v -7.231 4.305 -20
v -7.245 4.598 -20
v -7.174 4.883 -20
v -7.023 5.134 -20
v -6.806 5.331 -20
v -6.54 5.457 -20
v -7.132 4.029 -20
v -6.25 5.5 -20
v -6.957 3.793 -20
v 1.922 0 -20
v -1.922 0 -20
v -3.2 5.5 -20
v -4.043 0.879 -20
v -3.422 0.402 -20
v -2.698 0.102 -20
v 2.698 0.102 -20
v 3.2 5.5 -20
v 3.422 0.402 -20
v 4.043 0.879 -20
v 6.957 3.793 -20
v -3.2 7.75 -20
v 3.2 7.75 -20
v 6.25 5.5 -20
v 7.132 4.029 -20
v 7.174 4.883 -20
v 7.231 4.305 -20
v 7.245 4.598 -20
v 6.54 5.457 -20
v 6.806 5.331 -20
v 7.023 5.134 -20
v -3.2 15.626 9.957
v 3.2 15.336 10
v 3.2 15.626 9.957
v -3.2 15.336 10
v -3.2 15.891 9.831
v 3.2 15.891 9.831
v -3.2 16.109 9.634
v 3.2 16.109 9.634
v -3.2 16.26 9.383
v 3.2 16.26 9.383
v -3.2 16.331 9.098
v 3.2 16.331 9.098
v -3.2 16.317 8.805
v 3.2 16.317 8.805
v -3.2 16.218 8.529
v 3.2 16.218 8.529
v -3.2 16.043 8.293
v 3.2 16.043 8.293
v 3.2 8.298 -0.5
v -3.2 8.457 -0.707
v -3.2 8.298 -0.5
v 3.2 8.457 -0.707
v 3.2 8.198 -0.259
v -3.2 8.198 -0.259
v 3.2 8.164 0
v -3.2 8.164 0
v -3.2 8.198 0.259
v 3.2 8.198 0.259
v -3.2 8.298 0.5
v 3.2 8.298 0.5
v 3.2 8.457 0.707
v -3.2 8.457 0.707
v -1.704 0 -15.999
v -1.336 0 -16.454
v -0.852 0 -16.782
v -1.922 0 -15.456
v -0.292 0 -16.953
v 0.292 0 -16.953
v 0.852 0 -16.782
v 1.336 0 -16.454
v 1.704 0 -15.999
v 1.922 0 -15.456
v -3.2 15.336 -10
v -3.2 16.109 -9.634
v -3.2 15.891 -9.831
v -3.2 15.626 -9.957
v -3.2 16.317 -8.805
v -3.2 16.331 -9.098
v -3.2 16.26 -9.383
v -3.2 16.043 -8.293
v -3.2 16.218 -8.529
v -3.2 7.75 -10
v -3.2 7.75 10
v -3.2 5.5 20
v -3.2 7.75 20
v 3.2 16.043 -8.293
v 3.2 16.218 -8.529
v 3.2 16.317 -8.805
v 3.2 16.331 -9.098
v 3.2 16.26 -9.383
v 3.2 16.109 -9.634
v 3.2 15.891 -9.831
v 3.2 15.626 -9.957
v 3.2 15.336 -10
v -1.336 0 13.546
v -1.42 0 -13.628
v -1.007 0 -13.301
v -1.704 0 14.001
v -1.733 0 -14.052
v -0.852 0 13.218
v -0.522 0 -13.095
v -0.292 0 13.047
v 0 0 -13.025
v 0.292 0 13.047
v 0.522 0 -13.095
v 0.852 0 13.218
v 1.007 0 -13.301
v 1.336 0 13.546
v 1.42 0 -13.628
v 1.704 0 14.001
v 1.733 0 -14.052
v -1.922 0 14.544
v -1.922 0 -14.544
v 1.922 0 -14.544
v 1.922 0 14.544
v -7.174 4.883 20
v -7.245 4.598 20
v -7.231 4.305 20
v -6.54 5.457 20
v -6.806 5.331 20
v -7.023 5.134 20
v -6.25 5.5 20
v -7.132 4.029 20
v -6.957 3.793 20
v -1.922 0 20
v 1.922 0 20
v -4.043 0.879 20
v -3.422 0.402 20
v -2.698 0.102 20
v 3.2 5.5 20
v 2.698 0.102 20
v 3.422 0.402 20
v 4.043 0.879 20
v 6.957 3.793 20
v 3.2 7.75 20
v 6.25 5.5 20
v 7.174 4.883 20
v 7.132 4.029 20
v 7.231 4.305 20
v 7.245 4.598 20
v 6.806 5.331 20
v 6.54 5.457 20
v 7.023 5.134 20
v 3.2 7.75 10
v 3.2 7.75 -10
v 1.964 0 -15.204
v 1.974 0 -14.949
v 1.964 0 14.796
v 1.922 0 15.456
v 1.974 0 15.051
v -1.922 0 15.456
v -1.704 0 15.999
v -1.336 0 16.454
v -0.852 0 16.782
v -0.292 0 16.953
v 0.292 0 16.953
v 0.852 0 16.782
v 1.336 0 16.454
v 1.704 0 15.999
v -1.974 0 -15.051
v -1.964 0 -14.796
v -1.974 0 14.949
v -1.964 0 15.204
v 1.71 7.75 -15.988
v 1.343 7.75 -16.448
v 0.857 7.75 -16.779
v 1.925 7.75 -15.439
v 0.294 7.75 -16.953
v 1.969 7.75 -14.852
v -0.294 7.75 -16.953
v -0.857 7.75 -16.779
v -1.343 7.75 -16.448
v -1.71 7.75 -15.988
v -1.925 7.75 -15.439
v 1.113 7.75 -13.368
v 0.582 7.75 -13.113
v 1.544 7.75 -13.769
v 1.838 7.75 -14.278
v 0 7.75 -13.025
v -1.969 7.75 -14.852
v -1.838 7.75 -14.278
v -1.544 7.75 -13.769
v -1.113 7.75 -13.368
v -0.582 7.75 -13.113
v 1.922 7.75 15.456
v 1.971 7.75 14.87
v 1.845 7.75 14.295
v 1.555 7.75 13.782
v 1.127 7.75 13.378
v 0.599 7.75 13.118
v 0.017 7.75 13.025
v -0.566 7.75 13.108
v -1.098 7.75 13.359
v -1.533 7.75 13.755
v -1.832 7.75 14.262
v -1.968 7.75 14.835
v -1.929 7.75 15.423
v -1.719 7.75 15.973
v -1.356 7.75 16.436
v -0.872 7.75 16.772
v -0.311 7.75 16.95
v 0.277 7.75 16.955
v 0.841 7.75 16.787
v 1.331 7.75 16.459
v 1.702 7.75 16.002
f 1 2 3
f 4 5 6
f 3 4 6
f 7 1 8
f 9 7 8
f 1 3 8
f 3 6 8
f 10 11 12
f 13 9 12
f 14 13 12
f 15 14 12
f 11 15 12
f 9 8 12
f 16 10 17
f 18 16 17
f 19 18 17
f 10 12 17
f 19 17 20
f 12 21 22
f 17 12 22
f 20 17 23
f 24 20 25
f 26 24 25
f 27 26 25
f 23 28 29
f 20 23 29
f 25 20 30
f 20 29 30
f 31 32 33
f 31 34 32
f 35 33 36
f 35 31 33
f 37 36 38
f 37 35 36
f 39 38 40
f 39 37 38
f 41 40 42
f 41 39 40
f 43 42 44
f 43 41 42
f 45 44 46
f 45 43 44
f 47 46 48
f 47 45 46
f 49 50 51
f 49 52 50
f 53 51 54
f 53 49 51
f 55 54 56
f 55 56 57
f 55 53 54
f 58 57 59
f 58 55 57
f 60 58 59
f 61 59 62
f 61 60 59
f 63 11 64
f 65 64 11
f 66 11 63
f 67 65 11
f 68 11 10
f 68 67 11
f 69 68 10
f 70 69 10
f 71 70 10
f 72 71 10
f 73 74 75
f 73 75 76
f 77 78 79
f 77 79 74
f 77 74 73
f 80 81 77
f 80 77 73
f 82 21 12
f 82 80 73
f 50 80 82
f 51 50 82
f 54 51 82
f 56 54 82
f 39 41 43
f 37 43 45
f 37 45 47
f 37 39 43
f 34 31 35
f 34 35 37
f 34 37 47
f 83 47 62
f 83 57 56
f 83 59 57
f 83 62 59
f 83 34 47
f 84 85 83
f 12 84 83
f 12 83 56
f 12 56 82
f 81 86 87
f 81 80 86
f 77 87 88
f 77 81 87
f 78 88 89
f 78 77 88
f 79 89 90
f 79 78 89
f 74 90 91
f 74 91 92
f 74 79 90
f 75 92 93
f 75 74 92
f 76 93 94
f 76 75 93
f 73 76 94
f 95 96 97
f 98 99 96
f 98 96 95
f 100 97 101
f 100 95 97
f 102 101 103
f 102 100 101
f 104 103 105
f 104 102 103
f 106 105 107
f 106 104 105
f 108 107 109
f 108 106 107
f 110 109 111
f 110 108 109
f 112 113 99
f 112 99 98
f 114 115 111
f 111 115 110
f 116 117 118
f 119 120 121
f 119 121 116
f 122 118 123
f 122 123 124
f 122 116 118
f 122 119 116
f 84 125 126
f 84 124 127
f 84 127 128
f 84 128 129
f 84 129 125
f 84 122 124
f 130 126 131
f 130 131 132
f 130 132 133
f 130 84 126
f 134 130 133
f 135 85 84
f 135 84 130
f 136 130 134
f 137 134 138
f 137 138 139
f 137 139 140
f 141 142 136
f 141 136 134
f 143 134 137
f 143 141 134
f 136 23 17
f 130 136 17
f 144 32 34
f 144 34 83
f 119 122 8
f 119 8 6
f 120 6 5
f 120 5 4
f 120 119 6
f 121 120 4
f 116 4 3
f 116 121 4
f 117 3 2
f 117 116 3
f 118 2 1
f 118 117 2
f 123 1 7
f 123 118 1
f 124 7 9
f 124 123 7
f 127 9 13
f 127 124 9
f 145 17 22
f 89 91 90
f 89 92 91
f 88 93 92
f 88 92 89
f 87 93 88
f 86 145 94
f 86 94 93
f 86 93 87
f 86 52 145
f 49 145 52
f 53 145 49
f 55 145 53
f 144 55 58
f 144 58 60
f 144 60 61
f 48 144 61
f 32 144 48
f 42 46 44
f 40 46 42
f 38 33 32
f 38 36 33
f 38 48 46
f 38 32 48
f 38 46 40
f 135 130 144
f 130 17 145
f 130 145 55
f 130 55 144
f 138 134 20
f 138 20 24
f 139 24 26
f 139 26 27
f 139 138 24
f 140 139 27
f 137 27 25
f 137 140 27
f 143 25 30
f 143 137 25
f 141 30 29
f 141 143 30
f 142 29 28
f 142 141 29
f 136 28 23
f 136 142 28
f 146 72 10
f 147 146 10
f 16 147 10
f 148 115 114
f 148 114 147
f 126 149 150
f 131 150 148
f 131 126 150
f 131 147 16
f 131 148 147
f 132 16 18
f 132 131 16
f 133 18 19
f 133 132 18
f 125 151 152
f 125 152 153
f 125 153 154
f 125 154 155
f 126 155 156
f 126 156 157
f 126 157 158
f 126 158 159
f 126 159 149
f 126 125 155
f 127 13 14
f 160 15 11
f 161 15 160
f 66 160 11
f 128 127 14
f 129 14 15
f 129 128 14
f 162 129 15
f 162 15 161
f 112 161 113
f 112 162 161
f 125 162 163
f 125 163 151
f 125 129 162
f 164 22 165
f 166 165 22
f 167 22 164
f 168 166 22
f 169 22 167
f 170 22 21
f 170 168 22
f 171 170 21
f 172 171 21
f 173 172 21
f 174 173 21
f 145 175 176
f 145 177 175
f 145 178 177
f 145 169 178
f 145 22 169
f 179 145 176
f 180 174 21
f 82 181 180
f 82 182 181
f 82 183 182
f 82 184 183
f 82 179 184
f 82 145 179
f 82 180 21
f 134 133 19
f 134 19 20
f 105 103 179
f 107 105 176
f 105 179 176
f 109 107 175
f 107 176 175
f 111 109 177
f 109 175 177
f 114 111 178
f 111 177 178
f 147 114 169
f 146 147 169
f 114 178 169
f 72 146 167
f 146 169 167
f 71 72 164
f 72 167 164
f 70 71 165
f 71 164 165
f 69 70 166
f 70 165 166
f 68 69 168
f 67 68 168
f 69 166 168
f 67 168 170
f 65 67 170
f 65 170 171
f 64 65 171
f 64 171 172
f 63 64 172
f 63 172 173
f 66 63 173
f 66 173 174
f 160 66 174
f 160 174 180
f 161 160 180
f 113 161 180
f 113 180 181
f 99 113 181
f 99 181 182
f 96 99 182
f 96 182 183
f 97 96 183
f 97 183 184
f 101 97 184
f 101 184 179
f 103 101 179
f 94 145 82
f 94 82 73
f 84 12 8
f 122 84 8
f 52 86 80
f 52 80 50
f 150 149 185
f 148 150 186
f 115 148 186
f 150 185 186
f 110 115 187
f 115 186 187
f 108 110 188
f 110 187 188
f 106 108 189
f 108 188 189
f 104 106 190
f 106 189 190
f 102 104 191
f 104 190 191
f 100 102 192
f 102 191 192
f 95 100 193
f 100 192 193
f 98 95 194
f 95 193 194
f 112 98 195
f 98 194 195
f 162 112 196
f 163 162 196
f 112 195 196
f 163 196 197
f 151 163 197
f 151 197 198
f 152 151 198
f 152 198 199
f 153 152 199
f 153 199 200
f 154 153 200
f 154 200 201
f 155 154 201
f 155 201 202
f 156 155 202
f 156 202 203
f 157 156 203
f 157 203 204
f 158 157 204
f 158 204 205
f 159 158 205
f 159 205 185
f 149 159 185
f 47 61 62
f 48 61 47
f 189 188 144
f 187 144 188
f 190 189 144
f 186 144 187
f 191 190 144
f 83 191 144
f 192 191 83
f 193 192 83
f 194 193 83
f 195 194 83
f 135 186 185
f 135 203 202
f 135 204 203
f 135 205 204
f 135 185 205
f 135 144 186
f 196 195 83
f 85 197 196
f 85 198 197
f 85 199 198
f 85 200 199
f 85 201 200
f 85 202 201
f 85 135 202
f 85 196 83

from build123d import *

# Parameters (mm, degrees)
BOSS_EXTRUDE1_DEPTH             = 20
SKETCH3_R                       = 1.975
CUT_EXTRUDE1_DEPTH              = 23.641223465
BOSS_EXTRUDE2_REACH             = 24.641
BOSS_EXTRUDE2_DIRECTION_2_REACH = 24.641
FILLET1_R                       = 1


with BuildPart() as part:
    # Sketch2 → Boss-Extrude1 (new, symmetric)
    with BuildSketch(Plane.XY):
        with BuildLine():
            Line((-1.921572875, 0), (1.921572875, 0))
            ThreePointArc((1.921572875, 0), (3.069623172, 0.228361402), (4.042893219, 0.878679656))
            Line((4.042893219, 0.878679656), (6.957106781, 3.792893219))
            ThreePointArc((6.957106781, 3.792893219), (7.173879533, 4.882683432), (6.25, 5.5))
            Line((6.25, 5.5), (3.2, 5.5))
            Line((3.2, 5.5), (3.2, 7.75))
            Line((3.2, 7.75), (-3.2, 7.75))
            Line((-3.2, 7.75), (-3.2, 5.5))
            Line((-3.2, 5.5), (-6.25, 5.5))
            ThreePointArc((-6.25, 5.5), (-7.173879533, 4.882683432), (-6.957106781, 3.792893219))
            Line((-6.957106781, 3.792893219), (-4.042893219, 0.878679656))
            ThreePointArc((-4.042893219, 0.878679656), (-3.069623172, 0.228361402), (-1.921572875, 0))
        make_face()
    extrude(amount=BOSS_EXTRUDE1_DEPTH, both=True)

    # Sketch3 → Cut-Extrude1 (cut, through all)
    with BuildSketch(Plane(origin=(0, 7.75, 0), x_dir=(1, 0, 0), z_dir=(0, 1, 0))):
        with Locations(Location((0, 15, 0), (0, 0, 270))):
            Circle(SKETCH3_R)
        with Locations(Location((0, -15, 0), (0, 0, 346.642693005))):
            Circle(SKETCH3_R)
    extrude(amount=-CUT_EXTRUDE1_DEPTH, mode=Mode.SUBTRACT)

    # Boss-Extrude2: up to this face of the body (flat: up to its plane)
    boss_extrude2_end = Plane(part.part.faces().sort_by_distance((3.2, 6.625, 0))[0])
    # Sketch4 → Boss-Extrude2 (add, up to the picked face)
    with BuildSketch(Plane(origin=(0, 0, 0), x_dir=(0, 0, -1), z_dir=(1, 0, 0)), mode=Mode.PRIVATE) as boss_extrude2_sk1:
        Polygon((-10, 17.75), (-10, 7.75), (0, 7.75), align=None)
    boss_extrude2_tool1 = split(extrude(boss_extrude2_sk1.sketch, amount=BOSS_EXTRUDE2_REACH, mode=Mode.PRIVATE), bisect_by=boss_extrude2_end, keep=Keep.BOTH, mode=Mode.PRIVATE)
    # Sketch4 → Boss-Extrude2 (add, up to the picked face)
    with BuildSketch(Plane(origin=(0, 0, 0), x_dir=(0, 0, -1), z_dir=(1, 0, 0)), mode=Mode.PRIVATE) as boss_extrude2_sk2:
        Polygon((10, 17.75), (0, 7.75), (10, 7.75), align=None)
    boss_extrude2_tool2 = split(extrude(boss_extrude2_sk2.sketch, amount=BOSS_EXTRUDE2_REACH, mode=Mode.PRIVATE), bisect_by=boss_extrude2_end, keep=Keep.BOTH, mode=Mode.PRIVATE)
    add(boss_extrude2_tool1.solids().sort_by(Axis((0, 11.083333, 6.666667), (1, 0, 0)))[0])
    add(boss_extrude2_tool2.solids().sort_by(Axis((0, 11.083333, -6.666667), (1, 0, 0)))[0])

    # Boss-Extrude2 direction 2: up to this face of the body (flat: up to its plane)
    boss_extrude2_direction_2_end = Plane(part.part.faces().sort_by_distance((-3.2, 6.625, 0))[0])
    # Sketch4 → Boss-Extrude2 direction 2 (add, up to the picked face)
    with BuildSketch(Plane(origin=(0, 0, 0), x_dir=(0, 0, -1), z_dir=(1, 0, 0)), mode=Mode.PRIVATE) as boss_extrude2_direction_2_sk1:
        Polygon((-10, 17.75), (-10, 7.75), (0, 7.75), align=None)
    boss_extrude2_direction_2_tool1 = split(extrude(boss_extrude2_direction_2_sk1.sketch, amount=-BOSS_EXTRUDE2_DIRECTION_2_REACH, mode=Mode.PRIVATE), bisect_by=boss_extrude2_direction_2_end, keep=Keep.BOTH, mode=Mode.PRIVATE)
    # Sketch4 → Boss-Extrude2 direction 2 (add, up to the picked face)
    with BuildSketch(Plane(origin=(0, 0, 0), x_dir=(0, 0, -1), z_dir=(1, 0, 0)), mode=Mode.PRIVATE) as boss_extrude2_direction_2_sk2:
        Polygon((10, 17.75), (0, 7.75), (10, 7.75), align=None)
    boss_extrude2_direction_2_tool2 = split(extrude(boss_extrude2_direction_2_sk2.sketch, amount=-BOSS_EXTRUDE2_DIRECTION_2_REACH, mode=Mode.PRIVATE), bisect_by=boss_extrude2_direction_2_end, keep=Keep.BOTH, mode=Mode.PRIVATE)
    add(boss_extrude2_direction_2_tool1.solids().sort_by(Axis((0, 11.083333, 6.666667), (-1, 0, 0)))[0])
    add(boss_extrude2_direction_2_tool2.solids().sort_by(Axis((0, 11.083333, -6.666667), (-1, 0, 0)))[0])

    # Fillet1
    fillet1_edges = [part.edges().sort_by_distance(p)[0] for p in [
        (0, 17.75, 10),
        (0, 7.75, 0),
        (0, 17.75, -10),
    ]]
    fillet(fillet1_edges, radius=FILLET1_R)


solid = part.part
